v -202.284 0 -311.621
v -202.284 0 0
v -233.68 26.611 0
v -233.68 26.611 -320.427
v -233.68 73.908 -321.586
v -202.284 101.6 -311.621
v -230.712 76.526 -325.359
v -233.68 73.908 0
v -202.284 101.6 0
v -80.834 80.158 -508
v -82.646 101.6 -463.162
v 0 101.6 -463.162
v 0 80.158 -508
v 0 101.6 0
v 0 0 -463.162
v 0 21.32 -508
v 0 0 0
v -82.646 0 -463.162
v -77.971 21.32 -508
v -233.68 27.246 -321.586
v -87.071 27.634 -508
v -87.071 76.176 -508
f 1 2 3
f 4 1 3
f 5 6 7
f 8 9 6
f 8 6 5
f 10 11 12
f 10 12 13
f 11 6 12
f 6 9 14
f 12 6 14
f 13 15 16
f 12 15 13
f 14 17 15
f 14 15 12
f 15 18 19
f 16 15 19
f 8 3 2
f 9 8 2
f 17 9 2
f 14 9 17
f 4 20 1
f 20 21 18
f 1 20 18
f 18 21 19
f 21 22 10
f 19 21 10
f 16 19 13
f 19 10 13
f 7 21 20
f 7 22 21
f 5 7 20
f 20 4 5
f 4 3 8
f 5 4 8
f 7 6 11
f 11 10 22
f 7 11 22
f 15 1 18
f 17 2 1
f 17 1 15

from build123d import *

# Parameters (mm, degrees)
SKETCH1_W           = 233.68
SKETCH1_H           = 101.6
BOSS_EXTRUDE1_DEPTH = 508
CUT_EXTRUDE1_DEPTH  = 569.324645251
CUT_EXTRUDE2_DEPTH  = 569.324645251
CUT_EXTRUDE3_DEPTH  = 569.324645251
CUT_EXTRUDE4_DEPTH  = 538.880617648


with BuildPart() as part:
    # Sketch1 → Boss-Extrude1 (new body)
    with BuildSketch(Plane.XY):
        with Locations((-116.84, 50.8)):
            Rectangle(SKETCH1_W, SKETCH1_H)
    extrude(amount=-BOSS_EXTRUDE1_DEPTH)

    # Sketch2 → Cut-Extrude1 (cut, through all)
    with BuildSketch(Plane.XY):
        Polygon((-202.283526953, 101.6), (-233.68, 73.908067848), (-233.68, 101.6), align=None)
        Polygon((-202.283526953, 0), (-233.68, 26.611014762), (-233.68, 0), align=None)
    extrude(amount=-CUT_EXTRUDE1_DEPTH, mode=Mode.SUBTRACT)

    # Sketch3 → Cut-Extrude2 (cut, through all)
    with BuildSketch(Plane(origin=(0, 101.6, 0), x_dir=(1, 0, 0), z_dir=(0, 1, 0))):
        Polygon((-87.070770682, 508), (-233.68, 321.585732495), (-233.68, 508), align=None)
    extrude(amount=-CUT_EXTRUDE2_DEPTH, mode=Mode.SUBTRACT)

    # Sketch4 → Cut-Extrude3 (cut, through all)
    with BuildSketch(Plane(origin=(0, 0, 0), x_dir=(0, 0, -1), z_dir=(1, 0, 0))):
        Polygon((463.161638797, 101.6), (508, 80.157516446), (508, 101.6), align=None)
        Polygon((463.161638797, 0), (508, 21.319923331), (508, 0), align=None)
    extrude(amount=-CUT_EXTRUDE3_DEPTH, mode=Mode.SUBTRACT)

    # Sketch5 → Cut-Extrude4 (cut, through all)
    with BuildSketch(Plane(origin=(217.205760792, 0, -275.127297003), x_dir=(-0.7848827655334263, 1.8564028129682992e-15, -0.6196442885790207), z_dir=(0.6196442885790207, 2.3514435630931796e-15, -0.7848827655334263))):
        Polygon((351.862738174, 101.6), (383.119645888, 76.175565291), (383.013937726, 101.6), align=None)
        Polygon((383.119645888, 27.634188335), (351.862738174, 0), (383.013937726, 0), align=None)
    extrude(amount=-CUT_EXTRUDE4_DEPTH, mode=Mode.SUBTRACT)


with BuildPart() as cut_extrude4_kept_piece:
    # of the separate pieces the step leaves, the one the design keeps (cut_extrude4_pieces_kept)
    add(part.part.solids().sort_by_distance((0, 0, 0))[0])


solid = cut_extrude4_kept_piece.part
